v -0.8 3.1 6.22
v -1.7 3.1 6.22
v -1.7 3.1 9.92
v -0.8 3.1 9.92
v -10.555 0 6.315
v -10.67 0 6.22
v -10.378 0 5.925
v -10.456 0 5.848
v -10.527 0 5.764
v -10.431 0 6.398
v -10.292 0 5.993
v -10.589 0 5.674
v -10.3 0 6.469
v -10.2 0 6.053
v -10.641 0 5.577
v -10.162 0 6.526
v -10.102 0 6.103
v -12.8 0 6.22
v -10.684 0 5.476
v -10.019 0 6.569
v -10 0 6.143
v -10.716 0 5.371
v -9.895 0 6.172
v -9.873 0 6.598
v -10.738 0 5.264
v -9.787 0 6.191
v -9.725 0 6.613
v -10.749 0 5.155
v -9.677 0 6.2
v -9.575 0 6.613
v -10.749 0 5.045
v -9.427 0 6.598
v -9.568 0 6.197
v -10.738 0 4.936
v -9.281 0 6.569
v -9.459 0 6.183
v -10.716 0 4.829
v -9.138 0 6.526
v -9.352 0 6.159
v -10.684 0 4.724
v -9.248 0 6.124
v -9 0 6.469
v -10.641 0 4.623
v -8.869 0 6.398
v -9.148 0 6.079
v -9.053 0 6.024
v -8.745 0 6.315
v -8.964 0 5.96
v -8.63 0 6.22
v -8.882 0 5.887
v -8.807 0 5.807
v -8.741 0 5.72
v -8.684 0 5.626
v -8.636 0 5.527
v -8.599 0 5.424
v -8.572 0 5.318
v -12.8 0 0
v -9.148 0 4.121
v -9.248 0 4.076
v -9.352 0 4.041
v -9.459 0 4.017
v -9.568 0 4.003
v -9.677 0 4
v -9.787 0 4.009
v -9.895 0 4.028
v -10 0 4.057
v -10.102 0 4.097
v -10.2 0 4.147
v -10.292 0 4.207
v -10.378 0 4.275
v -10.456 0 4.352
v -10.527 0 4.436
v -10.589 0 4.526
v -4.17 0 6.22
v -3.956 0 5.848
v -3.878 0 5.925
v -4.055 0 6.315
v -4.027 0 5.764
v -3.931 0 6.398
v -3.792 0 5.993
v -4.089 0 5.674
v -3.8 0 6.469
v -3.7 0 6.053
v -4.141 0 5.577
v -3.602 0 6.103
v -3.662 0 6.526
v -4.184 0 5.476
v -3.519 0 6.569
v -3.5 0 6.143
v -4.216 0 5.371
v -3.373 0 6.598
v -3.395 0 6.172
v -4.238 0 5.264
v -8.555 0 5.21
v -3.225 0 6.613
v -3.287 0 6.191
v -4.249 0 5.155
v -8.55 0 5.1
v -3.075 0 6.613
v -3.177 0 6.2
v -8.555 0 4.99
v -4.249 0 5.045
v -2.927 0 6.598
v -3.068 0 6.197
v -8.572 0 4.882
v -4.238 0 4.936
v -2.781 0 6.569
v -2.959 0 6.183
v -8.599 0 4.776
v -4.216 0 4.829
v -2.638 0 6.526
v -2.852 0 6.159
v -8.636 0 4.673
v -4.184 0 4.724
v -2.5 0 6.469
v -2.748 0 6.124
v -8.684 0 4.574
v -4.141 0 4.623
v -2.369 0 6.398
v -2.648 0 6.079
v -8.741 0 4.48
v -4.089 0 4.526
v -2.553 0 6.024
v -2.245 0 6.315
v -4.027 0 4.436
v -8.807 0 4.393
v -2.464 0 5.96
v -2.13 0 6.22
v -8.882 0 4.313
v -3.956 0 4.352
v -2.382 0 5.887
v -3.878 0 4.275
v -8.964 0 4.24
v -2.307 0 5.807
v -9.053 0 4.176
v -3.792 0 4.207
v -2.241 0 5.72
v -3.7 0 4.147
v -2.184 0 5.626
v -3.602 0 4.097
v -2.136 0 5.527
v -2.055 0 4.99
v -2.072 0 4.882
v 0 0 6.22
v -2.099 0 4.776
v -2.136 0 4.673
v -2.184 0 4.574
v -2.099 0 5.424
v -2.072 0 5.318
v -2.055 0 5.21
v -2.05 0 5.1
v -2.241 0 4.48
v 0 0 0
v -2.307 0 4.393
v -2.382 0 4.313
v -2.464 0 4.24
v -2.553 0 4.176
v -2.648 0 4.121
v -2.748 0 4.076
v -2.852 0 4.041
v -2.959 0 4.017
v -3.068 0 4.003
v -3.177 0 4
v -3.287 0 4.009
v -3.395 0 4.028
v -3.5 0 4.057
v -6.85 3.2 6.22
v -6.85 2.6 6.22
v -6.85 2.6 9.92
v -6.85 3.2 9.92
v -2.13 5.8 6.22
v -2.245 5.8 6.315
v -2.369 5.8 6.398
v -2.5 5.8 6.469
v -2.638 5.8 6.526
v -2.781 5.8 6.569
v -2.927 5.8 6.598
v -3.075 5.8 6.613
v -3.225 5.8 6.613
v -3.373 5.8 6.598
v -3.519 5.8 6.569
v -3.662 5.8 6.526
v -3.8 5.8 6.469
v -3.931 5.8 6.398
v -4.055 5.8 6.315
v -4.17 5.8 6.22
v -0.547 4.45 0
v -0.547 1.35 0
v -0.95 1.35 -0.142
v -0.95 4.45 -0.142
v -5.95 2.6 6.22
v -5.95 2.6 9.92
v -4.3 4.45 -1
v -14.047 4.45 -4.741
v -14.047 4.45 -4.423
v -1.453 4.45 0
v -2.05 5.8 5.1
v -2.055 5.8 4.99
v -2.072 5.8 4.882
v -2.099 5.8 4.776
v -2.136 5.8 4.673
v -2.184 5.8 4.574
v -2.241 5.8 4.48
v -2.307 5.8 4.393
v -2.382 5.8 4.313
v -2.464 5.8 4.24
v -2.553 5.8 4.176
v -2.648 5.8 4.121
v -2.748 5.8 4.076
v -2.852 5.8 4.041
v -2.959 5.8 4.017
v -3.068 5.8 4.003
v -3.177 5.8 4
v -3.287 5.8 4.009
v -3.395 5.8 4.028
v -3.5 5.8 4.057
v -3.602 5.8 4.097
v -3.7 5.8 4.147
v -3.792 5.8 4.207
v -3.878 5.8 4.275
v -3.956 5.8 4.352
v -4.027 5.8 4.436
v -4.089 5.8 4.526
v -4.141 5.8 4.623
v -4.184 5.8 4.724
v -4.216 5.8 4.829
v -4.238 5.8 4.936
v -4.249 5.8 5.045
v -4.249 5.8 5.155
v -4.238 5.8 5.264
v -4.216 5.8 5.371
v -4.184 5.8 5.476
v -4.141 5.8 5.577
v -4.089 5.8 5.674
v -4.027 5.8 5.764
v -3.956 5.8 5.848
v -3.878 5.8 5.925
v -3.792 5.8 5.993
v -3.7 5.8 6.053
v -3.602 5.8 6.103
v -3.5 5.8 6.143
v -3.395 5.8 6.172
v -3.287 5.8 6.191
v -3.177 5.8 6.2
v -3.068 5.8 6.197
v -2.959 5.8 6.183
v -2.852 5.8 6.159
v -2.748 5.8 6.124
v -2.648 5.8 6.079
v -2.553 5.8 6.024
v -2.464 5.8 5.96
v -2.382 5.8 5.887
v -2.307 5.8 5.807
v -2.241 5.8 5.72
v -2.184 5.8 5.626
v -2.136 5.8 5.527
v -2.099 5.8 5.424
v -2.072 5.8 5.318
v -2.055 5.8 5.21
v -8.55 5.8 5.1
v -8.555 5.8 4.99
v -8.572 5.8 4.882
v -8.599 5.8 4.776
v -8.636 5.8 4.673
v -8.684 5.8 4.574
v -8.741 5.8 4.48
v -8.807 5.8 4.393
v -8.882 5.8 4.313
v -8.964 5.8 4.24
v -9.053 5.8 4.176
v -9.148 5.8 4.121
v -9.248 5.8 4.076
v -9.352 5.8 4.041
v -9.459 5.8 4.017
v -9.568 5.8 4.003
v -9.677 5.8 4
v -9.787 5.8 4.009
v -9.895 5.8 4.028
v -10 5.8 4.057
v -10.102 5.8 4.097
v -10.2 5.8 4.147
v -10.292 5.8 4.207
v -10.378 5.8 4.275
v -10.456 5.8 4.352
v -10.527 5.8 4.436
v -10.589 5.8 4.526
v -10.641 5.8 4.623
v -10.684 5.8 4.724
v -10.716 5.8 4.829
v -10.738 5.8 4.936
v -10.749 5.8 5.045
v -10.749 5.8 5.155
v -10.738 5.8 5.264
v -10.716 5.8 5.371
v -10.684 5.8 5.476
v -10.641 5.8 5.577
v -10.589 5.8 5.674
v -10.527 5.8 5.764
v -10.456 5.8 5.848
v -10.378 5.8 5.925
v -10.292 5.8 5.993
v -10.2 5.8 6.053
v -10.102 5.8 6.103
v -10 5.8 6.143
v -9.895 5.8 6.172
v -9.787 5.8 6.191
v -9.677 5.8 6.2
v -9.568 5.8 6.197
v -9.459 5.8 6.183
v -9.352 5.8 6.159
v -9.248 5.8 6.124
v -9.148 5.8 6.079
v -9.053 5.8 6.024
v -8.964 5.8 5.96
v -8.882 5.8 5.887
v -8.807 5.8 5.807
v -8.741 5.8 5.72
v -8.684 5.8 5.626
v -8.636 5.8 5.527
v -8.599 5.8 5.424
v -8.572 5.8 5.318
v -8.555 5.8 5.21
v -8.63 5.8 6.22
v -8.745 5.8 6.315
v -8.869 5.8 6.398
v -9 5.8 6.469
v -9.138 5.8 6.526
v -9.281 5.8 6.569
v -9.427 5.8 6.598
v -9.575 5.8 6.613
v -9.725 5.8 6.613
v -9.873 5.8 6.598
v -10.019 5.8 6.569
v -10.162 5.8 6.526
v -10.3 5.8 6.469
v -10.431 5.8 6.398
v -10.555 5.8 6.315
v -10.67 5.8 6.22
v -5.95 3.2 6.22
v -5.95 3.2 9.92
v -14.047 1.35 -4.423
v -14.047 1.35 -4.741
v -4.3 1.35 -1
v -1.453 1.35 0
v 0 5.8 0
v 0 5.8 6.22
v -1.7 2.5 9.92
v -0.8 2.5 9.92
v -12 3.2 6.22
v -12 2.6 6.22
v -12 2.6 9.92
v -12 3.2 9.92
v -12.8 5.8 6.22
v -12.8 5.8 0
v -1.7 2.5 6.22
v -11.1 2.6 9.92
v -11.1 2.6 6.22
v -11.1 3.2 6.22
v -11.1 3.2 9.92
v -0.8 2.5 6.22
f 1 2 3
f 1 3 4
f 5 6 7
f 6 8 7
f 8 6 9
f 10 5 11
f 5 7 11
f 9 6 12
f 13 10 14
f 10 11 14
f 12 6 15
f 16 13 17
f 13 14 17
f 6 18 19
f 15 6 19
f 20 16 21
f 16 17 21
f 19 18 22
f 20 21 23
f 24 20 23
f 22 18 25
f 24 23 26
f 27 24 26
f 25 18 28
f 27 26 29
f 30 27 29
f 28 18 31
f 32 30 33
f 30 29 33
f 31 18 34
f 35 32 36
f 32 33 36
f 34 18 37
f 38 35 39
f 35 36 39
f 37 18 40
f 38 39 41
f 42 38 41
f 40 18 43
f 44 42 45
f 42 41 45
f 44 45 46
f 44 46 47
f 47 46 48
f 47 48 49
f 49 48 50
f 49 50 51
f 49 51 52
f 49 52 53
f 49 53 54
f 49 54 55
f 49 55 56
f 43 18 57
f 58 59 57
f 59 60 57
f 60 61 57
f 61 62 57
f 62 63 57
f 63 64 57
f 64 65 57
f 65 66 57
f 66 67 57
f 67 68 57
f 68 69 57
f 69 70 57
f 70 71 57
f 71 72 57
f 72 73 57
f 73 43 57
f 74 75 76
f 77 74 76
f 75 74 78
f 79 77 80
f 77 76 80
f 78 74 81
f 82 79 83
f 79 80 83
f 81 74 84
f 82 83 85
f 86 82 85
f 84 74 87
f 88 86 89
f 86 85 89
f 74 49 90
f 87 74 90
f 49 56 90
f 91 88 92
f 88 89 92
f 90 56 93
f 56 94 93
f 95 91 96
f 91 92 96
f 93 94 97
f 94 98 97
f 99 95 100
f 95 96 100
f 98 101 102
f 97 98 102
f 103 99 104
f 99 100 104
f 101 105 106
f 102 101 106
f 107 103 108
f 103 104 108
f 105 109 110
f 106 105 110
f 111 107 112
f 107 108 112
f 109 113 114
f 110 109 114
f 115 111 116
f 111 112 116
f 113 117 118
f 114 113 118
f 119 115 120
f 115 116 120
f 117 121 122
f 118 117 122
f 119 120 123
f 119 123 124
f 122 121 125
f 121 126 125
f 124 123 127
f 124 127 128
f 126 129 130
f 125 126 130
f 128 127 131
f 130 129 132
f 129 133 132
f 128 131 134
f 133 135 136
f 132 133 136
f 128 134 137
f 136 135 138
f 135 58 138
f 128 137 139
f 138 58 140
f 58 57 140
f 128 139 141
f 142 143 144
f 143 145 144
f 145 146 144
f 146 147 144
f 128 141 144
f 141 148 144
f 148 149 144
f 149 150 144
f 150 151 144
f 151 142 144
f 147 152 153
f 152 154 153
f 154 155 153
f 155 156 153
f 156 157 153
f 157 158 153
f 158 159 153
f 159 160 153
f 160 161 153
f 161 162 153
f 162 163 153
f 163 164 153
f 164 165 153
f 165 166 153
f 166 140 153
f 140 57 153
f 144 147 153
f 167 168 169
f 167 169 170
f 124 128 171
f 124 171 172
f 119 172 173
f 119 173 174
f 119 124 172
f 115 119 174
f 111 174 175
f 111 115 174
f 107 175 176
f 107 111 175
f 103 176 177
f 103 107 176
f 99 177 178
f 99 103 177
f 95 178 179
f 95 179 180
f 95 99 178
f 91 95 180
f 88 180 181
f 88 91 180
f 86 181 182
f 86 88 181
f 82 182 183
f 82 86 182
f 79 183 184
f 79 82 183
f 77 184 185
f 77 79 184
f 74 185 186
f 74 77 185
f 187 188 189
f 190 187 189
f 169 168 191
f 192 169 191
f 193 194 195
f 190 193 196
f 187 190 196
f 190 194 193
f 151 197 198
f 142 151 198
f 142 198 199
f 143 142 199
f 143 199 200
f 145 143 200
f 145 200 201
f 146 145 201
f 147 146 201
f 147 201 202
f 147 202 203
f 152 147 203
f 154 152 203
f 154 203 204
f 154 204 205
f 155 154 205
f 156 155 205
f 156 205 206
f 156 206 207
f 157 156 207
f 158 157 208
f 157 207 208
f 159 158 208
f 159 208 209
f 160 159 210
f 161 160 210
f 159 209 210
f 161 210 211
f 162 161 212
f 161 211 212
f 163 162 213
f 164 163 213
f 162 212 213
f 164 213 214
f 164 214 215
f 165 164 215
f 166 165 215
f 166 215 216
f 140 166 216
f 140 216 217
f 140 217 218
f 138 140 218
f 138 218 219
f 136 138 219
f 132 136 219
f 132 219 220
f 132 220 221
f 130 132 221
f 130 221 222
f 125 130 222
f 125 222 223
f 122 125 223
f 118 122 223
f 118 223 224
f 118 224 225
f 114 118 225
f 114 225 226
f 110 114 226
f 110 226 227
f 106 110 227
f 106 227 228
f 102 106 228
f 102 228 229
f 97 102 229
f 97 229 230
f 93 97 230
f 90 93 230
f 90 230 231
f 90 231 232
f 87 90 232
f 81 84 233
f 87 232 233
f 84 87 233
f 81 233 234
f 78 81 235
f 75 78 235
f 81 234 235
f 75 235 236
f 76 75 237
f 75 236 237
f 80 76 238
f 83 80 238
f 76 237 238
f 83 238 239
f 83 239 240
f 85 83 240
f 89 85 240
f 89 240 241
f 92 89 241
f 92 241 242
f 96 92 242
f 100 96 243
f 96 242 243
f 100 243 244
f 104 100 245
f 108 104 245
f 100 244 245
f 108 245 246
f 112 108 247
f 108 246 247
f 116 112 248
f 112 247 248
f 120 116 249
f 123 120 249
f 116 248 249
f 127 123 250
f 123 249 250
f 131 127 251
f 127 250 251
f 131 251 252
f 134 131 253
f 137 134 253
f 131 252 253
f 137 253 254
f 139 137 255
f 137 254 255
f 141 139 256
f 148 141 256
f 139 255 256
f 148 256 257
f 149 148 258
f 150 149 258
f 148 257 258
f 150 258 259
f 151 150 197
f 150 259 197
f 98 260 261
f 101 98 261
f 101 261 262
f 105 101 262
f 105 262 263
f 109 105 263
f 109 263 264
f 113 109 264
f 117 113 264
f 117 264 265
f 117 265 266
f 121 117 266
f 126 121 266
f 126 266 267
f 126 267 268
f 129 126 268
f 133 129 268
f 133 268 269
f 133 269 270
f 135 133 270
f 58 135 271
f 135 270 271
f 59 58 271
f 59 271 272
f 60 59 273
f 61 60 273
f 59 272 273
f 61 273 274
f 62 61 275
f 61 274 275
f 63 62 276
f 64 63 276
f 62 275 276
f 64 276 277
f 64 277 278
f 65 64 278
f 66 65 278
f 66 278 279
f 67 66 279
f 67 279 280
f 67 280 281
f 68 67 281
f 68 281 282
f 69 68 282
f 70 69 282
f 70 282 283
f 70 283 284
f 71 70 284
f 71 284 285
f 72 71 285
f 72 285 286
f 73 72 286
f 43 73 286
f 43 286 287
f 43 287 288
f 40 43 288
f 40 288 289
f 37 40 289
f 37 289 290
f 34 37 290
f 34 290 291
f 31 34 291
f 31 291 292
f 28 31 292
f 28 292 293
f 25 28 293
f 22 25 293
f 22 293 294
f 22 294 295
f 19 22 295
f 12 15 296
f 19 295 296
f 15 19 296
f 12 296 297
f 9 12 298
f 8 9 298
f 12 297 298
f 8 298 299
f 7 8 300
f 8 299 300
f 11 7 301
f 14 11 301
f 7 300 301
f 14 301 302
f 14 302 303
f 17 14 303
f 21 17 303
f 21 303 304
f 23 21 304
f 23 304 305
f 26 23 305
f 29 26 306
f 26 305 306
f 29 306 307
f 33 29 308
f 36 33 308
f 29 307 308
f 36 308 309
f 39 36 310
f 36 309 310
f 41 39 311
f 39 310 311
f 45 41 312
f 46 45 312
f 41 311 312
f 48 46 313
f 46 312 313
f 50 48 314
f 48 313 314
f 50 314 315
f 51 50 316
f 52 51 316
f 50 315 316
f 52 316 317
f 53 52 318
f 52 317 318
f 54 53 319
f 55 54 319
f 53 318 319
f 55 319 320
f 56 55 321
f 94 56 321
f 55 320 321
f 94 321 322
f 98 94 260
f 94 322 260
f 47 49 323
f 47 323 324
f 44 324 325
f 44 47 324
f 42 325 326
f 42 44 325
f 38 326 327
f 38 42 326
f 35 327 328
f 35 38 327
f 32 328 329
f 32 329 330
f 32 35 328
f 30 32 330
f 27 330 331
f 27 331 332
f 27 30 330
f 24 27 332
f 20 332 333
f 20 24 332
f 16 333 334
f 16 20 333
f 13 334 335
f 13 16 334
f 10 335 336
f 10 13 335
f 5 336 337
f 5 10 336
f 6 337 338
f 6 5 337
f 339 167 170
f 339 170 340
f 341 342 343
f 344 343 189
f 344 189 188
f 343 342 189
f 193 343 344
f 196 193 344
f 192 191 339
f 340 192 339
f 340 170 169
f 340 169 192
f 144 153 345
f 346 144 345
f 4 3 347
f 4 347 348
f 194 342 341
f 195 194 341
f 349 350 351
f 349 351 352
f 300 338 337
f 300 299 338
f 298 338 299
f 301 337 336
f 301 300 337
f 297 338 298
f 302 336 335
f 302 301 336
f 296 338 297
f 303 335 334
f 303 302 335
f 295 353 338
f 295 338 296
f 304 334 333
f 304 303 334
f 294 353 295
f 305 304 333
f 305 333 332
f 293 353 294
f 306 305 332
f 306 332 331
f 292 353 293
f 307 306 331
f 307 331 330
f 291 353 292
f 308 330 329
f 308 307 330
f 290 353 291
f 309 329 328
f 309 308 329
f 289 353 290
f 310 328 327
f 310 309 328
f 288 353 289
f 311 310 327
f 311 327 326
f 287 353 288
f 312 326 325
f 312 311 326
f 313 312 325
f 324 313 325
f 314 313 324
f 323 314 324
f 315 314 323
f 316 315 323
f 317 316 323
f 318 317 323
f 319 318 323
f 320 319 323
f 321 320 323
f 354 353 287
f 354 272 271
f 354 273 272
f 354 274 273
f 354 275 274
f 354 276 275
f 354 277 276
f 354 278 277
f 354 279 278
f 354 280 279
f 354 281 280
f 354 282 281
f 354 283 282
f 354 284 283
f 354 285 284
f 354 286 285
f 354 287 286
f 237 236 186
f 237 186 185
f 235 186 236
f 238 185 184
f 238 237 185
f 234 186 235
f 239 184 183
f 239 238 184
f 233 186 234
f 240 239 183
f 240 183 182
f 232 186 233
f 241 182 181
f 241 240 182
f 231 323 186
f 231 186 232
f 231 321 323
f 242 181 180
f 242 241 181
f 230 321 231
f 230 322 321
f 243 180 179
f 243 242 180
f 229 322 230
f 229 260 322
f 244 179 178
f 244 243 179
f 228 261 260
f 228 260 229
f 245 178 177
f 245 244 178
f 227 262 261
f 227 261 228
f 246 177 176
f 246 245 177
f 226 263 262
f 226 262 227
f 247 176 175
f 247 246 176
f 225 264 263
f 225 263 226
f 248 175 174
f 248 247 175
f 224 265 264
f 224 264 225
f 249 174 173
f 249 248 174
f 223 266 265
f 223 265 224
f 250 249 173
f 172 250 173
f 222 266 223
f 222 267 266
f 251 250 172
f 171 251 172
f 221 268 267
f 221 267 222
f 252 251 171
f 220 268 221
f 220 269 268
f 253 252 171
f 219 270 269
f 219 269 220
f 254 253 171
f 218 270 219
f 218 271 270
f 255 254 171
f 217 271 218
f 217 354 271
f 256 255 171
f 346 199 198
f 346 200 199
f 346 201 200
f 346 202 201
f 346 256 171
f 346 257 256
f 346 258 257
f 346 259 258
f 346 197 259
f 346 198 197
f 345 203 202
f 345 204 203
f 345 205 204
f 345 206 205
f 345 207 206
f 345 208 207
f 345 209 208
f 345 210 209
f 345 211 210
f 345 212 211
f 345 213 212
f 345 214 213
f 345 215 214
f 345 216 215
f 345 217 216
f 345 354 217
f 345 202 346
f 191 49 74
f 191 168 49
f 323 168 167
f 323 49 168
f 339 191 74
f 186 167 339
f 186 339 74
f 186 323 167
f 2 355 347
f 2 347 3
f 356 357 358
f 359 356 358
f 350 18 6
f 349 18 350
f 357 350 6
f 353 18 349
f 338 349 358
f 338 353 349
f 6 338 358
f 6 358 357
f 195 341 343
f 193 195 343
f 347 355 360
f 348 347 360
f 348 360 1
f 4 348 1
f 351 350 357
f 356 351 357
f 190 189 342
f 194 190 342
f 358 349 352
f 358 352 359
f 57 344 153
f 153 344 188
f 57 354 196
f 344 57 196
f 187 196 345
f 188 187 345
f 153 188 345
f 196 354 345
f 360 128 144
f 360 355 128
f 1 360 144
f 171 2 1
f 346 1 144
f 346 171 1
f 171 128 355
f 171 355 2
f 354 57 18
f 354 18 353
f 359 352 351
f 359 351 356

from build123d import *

# Parameters (mm, degrees)
SKETCH2_W            = 12.8
SKETCH2_H            = 5.8
BOSS_EXTRUDE1_DEPTH  = 6.22
M2_CLEARANCE_HOLE1_D = 2.2
BOSS_EXTRUDE2_DEPTH  = 5.8
SKETCH17_W           = 0.9
SKETCH17_H           = 0.6
BOSS_EXTRUDE3_DEPTH  = 3.7
BOSS_EXTRUDE5_DEPTH  = 3.1


with BuildPart() as part:
    # Sketch2 → Boss-Extrude1 (new body)
    with BuildSketch(Plane.XY):
        with Locations((-6.4, 2.9)):
            Rectangle(SKETCH2_W, SKETCH2_H)
    extrude(amount=BOSS_EXTRUDE1_DEPTH)

    # M2 Clearance Hole1 (through all)
    with Locations(Plane(origin=(0, 0, 0), x_dir=(-1, 0, 0), z_dir=(0, -1, 0))):
        with Locations((9.65, -5.1), (3.15, -5.1)):
            Hole(M2_CLEARANCE_HOLE1_D / 2)

    # Sketch16 → Boss-Extrude2 (add, through all)
    with BuildSketch(Plane.XZ):
        with BuildLine():
            Line((-10.670208312, 6.22), (-8.629791688, 6.22))
            ThreePointArc((-8.629791688, 6.22), (-9.65, 6.615), (-10.670208312, 6.22))
        make_face()
        with BuildLine():
            Line((-4.170208312, 6.22), (-2.129791688, 6.22))
            ThreePointArc((-2.129791688, 6.22), (-3.15, 6.615), (-4.170208312, 6.22))
        make_face()
    extrude(amount=-BOSS_EXTRUDE2_DEPTH)

    # Sketch17 → Boss-Extrude3 (add)
    with BuildSketch(Plane.XY.offset(6.22)):
        with Locations((-6.4, 2.9)):
            Rectangle(SKETCH17_W, SKETCH17_H)
        with Locations((-11.55, 2.9)):
            Rectangle(SKETCH17_W, SKETCH17_H)
        with Locations((-1.25, 2.8)):
            Rectangle(SKETCH17_W, SKETCH17_H)
    extrude(amount=BOSS_EXTRUDE3_DEPTH)

    # Sketch19 → Boss-Extrude5 (add)
    with BuildSketch(Plane(origin=(0, 1.35, 0), x_dir=(1, 0, 0), z_dir=(0, 1, 0))):
        Polygon((-4.3, 1), (-1.452673729, 0), (-1, 0), (-0.547326271, 0), (-0.950295326, 0.141525423), (-14.047326271, 4.741290149), (-14.047326271, 4.423326076), align=None)
    extrude(amount=BOSS_EXTRUDE5_DEPTH)


solid = part.part
